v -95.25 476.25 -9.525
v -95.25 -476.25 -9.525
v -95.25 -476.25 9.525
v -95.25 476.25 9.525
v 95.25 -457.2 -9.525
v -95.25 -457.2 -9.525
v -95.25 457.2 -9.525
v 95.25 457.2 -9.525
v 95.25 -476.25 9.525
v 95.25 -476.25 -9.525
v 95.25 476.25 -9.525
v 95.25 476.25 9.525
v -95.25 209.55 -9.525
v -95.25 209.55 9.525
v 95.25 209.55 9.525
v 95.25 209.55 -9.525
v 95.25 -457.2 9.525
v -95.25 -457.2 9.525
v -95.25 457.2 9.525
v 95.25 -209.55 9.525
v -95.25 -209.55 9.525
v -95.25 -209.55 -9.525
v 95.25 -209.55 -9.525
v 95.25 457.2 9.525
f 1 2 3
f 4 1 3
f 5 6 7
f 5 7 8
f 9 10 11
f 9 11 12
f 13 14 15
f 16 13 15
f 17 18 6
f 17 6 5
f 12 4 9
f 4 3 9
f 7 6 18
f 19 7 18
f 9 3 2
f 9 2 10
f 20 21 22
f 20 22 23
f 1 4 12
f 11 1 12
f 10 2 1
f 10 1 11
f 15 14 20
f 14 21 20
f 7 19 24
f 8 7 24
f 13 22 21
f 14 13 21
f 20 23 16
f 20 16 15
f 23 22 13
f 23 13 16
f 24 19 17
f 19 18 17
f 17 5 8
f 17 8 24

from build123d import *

# Parameters (mm, degrees)
F0_W     = 190.5
F0_H     = 19.05
F1_DEPTH = 209.55
F2_DEPTH = 457.2
F3_DEPTH = 476.25


with BuildPart() as f1:
    # F0 (on Front) → F1 (new body, symmetric)
    with BuildSketch(Plane.XZ):
        Rectangle(F0_W, F0_H)
    extrude(amount=F1_DEPTH, both=True)


with BuildPart() as f2:
    # F0 (on Front) → F2 (new body, symmetric)
    with BuildSketch(Plane.XZ):
        Rectangle(F0_W, F0_H)
    extrude(amount=F2_DEPTH, both=True)


with BuildPart() as f3:
    # F0 (on Front) → F3 (new body, symmetric)
    with BuildSketch(Plane.XZ):
        Rectangle(F0_W, F0_H)
    extrude(amount=F3_DEPTH, both=True)


solid = Compound([f1.part, f2.part, f3.part])
